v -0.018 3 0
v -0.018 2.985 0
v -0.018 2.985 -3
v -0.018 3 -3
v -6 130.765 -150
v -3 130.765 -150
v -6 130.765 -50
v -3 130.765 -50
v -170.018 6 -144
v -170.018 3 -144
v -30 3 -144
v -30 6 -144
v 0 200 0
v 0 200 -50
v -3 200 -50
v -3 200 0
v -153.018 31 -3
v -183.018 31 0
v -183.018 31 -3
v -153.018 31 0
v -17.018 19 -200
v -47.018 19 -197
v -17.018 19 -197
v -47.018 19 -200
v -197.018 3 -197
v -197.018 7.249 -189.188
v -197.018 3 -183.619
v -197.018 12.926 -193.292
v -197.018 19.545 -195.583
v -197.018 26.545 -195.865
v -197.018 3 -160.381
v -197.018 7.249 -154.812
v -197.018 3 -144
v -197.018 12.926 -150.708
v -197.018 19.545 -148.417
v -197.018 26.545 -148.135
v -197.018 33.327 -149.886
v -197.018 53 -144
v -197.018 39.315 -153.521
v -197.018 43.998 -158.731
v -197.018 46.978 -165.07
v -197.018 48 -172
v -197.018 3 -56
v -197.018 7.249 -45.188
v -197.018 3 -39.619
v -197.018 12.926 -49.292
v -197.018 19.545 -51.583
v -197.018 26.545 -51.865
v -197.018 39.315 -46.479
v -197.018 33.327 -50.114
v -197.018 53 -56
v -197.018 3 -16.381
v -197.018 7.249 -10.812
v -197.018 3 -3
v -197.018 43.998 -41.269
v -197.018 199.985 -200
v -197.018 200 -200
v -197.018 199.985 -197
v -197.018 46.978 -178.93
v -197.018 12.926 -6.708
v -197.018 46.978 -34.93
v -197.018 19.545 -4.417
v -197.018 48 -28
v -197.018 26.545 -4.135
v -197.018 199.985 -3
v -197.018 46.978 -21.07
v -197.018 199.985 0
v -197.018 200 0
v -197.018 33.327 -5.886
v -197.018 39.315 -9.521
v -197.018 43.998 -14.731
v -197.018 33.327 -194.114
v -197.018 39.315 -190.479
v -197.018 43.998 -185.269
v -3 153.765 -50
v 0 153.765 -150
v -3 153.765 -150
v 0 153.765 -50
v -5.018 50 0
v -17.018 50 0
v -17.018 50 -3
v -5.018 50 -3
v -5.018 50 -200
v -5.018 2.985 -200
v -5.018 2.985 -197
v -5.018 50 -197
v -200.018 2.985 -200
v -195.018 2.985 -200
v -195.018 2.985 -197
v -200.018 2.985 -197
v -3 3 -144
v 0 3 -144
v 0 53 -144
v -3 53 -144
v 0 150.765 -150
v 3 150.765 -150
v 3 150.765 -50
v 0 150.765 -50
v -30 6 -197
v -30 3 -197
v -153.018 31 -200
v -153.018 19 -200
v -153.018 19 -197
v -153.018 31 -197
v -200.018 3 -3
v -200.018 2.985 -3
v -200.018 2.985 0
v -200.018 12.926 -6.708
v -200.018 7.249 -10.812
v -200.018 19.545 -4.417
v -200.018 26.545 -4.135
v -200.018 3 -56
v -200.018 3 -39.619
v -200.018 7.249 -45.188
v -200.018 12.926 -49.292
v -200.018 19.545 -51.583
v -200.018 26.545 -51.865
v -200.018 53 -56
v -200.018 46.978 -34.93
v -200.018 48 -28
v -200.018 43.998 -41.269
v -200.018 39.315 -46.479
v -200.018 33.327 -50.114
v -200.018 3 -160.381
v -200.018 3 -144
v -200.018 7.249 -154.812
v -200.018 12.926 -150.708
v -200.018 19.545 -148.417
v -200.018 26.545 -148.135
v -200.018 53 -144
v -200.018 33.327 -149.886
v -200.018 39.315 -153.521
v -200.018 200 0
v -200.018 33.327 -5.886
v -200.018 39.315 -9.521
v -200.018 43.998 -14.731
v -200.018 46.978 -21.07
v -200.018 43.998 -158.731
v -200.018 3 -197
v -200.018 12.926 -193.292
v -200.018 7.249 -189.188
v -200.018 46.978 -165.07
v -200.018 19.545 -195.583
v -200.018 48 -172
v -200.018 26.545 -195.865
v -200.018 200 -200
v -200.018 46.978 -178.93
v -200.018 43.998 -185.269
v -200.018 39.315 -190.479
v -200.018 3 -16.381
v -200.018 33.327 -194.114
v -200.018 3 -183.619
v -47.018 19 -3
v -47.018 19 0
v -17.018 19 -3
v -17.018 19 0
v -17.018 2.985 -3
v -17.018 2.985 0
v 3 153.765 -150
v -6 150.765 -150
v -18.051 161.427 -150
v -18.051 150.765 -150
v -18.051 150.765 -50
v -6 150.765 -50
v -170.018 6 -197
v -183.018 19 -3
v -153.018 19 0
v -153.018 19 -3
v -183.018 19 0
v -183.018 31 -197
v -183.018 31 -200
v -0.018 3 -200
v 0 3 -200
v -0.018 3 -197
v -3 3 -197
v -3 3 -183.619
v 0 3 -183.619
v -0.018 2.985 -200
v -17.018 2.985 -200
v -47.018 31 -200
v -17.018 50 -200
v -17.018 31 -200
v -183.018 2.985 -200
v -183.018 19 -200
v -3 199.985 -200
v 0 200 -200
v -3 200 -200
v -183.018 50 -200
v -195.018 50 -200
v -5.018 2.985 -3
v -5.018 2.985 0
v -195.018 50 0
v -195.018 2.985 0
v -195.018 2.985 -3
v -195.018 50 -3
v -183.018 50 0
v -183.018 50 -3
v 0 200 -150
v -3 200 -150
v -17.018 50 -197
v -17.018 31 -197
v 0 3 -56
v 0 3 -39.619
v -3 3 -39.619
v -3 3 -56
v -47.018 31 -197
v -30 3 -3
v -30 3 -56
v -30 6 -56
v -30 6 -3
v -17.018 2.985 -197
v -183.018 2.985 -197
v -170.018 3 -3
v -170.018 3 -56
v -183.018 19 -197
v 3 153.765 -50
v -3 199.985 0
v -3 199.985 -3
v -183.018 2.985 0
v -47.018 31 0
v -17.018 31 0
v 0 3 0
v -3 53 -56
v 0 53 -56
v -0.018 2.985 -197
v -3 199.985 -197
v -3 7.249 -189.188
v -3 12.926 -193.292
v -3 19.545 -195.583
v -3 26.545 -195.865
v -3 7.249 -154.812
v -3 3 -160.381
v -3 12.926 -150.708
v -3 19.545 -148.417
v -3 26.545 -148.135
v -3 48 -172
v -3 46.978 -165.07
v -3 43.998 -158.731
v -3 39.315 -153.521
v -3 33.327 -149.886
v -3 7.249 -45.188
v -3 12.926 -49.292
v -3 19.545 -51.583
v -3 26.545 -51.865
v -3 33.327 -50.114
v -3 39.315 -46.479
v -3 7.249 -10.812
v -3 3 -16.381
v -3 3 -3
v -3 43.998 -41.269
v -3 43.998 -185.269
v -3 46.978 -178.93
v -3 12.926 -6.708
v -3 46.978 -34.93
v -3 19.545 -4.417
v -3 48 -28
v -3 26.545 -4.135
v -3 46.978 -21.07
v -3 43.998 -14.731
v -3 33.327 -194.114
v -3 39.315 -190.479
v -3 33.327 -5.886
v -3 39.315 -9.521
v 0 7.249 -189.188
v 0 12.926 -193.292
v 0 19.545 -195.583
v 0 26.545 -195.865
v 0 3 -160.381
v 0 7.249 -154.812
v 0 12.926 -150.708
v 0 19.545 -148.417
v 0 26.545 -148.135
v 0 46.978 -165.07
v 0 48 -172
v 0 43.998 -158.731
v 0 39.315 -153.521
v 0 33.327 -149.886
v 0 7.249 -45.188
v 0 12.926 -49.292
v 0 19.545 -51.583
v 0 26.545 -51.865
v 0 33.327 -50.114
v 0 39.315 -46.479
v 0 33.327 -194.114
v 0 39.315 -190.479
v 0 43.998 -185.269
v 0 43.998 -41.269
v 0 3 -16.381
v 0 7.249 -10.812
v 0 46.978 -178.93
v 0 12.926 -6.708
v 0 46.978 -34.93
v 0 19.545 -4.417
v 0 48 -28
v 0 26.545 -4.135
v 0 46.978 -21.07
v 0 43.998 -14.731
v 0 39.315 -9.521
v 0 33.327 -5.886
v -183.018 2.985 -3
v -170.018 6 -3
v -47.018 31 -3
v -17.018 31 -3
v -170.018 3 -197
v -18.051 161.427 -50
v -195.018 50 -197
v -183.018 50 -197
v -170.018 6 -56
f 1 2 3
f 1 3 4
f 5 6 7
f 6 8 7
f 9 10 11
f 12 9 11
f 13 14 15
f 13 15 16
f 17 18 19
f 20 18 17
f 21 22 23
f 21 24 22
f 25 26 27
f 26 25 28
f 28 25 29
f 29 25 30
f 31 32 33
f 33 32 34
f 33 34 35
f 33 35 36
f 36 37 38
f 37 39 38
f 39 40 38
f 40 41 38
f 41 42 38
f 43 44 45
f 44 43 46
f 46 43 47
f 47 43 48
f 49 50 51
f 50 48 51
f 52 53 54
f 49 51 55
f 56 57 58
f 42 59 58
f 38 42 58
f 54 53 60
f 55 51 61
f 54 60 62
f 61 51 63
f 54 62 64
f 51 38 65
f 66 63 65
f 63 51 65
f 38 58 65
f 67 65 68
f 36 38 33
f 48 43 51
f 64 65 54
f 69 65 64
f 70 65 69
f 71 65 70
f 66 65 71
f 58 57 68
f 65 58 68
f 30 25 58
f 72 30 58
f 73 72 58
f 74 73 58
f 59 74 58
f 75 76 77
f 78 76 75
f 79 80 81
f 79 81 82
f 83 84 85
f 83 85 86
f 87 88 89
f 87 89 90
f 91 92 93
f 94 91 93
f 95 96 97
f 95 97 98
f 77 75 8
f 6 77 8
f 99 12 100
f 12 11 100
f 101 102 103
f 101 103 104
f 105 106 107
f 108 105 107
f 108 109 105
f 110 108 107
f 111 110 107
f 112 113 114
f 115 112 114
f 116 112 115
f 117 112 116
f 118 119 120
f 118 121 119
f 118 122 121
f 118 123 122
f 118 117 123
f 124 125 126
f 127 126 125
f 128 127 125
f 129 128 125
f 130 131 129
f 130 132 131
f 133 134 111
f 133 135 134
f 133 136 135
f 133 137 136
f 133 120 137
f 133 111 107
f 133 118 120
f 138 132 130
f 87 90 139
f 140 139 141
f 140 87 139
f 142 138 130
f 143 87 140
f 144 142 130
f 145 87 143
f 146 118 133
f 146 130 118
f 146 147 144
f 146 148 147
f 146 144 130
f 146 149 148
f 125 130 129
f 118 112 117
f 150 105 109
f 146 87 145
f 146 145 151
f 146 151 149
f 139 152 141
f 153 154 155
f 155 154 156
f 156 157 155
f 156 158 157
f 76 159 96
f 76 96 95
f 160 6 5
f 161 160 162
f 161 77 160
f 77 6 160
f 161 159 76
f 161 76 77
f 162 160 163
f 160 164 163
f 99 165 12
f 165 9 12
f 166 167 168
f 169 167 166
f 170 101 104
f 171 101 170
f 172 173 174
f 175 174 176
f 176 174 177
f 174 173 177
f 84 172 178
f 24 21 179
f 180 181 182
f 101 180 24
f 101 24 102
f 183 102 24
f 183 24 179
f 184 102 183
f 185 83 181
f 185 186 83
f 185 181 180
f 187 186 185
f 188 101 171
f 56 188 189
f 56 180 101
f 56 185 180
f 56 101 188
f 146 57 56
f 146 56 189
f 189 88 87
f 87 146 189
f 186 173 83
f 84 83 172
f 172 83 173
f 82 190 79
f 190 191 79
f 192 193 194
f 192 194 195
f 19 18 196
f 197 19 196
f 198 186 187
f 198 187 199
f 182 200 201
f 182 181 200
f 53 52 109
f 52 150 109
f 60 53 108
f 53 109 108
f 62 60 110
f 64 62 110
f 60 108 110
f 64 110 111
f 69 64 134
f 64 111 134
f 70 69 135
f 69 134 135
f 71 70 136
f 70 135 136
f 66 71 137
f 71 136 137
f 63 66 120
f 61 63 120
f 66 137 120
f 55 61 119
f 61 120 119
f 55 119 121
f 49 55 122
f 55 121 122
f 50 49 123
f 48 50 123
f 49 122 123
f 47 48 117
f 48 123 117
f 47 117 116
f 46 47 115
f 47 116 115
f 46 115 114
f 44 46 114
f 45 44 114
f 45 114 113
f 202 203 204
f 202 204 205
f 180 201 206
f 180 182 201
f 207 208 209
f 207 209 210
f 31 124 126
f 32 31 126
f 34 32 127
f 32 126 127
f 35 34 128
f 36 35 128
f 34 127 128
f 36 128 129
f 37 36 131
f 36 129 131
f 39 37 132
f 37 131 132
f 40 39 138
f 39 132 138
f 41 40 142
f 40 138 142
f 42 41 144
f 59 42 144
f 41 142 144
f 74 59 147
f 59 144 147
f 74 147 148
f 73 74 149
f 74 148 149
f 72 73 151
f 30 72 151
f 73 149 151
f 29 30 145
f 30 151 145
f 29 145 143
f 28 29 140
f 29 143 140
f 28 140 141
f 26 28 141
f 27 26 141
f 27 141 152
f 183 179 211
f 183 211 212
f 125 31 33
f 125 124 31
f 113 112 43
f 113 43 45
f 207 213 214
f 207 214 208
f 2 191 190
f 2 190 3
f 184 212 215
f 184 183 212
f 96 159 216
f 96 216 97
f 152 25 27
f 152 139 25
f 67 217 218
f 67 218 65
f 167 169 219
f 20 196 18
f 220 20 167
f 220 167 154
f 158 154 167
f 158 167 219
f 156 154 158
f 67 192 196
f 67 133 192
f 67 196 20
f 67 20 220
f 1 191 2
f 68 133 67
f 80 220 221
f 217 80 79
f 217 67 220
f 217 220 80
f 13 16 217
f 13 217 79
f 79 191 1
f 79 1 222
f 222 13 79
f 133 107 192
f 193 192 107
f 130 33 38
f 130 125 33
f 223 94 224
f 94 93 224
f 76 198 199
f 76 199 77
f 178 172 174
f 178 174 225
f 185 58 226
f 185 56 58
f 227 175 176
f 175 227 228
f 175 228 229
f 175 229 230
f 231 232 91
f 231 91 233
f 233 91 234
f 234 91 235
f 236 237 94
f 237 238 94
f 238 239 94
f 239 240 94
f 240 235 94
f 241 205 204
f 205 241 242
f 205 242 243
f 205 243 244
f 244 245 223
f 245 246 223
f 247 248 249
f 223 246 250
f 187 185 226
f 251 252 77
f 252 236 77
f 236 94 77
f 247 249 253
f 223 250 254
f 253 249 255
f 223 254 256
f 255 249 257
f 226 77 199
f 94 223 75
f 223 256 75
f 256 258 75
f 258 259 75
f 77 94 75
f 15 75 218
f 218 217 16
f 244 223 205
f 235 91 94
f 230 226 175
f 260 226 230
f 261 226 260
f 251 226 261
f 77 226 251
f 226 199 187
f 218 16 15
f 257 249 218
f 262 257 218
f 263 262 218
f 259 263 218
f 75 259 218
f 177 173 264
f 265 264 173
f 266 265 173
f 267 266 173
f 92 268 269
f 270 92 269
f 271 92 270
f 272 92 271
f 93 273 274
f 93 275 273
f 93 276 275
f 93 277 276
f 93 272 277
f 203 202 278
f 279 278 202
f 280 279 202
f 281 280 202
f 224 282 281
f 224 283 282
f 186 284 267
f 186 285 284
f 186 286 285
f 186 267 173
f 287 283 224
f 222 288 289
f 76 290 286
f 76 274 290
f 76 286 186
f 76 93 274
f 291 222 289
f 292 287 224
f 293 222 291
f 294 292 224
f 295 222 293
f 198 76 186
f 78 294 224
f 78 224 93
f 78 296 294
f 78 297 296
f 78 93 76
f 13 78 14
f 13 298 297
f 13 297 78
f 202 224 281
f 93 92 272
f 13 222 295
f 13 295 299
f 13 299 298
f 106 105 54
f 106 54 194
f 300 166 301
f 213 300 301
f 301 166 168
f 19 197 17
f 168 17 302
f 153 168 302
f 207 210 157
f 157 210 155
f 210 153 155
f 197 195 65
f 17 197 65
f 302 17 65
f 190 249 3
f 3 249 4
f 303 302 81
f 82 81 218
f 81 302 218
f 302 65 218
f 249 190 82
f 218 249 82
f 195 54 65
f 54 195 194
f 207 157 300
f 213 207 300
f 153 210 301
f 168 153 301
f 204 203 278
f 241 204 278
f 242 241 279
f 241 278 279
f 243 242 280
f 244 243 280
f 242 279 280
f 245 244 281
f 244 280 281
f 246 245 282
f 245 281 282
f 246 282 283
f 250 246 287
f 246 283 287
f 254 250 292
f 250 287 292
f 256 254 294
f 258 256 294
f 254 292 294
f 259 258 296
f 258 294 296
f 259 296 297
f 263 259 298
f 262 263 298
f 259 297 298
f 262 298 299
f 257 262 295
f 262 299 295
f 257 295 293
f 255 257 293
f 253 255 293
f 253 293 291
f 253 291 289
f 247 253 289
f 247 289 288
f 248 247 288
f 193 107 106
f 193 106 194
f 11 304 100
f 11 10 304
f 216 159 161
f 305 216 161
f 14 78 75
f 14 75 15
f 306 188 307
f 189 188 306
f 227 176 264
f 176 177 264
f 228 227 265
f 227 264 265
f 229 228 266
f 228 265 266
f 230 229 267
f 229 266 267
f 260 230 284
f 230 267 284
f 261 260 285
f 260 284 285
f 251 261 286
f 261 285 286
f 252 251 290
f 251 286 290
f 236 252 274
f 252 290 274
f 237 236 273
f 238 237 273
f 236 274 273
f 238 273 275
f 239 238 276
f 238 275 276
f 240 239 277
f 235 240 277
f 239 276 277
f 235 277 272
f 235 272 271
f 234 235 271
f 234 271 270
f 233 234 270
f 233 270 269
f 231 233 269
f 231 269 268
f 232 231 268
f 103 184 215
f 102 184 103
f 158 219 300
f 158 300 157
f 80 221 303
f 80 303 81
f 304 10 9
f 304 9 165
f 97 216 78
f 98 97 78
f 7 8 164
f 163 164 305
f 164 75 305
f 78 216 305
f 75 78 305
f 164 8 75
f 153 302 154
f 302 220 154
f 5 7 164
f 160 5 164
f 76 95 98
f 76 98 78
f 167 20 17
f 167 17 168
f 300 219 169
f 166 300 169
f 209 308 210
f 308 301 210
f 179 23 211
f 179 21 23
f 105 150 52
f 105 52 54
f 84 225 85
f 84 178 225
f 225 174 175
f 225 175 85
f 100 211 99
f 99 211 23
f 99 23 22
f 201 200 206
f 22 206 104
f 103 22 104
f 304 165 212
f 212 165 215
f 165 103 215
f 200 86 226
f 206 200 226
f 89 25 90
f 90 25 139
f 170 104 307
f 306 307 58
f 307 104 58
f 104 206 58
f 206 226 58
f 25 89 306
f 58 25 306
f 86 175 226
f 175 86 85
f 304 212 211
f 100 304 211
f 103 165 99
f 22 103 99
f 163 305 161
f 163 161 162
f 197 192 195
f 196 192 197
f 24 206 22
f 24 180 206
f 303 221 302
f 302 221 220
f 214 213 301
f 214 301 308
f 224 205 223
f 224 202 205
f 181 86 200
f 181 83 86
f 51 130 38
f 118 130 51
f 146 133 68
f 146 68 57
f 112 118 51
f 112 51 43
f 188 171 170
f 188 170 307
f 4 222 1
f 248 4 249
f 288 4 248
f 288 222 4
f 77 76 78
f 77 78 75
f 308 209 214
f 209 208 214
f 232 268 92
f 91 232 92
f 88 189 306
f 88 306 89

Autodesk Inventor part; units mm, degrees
ref_plane "YZ Plane" through (0, 0, 0) normal (1, 0, 0) x (0, 1, 0)
ref_plane "XZ Plane" through (0, 0, 0) normal (0, 1, 0) x (-1, 0, 0)
ref_plane "XY Plane" through (0, 0, 0) normal (0, 0, 1) x (1, 0, 0)
sketch "Sketch1" plane through (0, 0, 0) normal (0, 0, 1) x (1, 0, 0)
  line L0 (-200.0185, 197.9846) -> (-0.0185, -2.0154) construction
  line L1 (-200.0185, -2.0154) -> (-0.0185, 197.9846) construction
  line L2 (-200.0185, 2.9846) -> (-0.0185, 2.9846)
  line L3 (-0.0185, 2.9846) -> (-5.0185, 2.9846)
  line L4 (-17.0185, -0.0154) -> (-5.0185, -0.0154)
  line L5 (-17.0185, 6.9846) -> (-17.0185, 18.9846)
  line L6 (-47.0185, 6.9846) -> (-17.0185, 18.9846) construction
  line L7 (-17.0185, 6.9846) -> (-47.0185, 18.9846) construction
  line L8 (-195.0185, 25.9846) -> (-195.0185, -0.0154)
  line L9 (-195.0185, -0.0154) -> (-183.0185, -0.0154)
  line L10 (-183.0185, -0.0154) -> (-183.0185, 25.9846)
  line L11 (-183.0185, 25.9846) -> (-195.0185, -0.0154) construction
  line L12 (-195.0185, 25.9846) -> (-183.0185, -0.0154) construction
  line L13 (-168.0185, 12.9846) -> (-183.0185, 6.9846) construction
  line L14 (-0.0185, 2.9846) -> (-0.0185, 199.9846)
  line L15 (-0.0185, 199.9846) -> (-200.0185, 199.9846)
  line L16 (-200.0185, 2.9846) -> (-200.0185, 199.9846)
  line L17 (-183.0185, 18.9846) -> (-180.1613, 17.8418) construction
  line L18 (-168.0185, 12.9846) -> (-153.0185, 6.9846) construction
  line L19 (-5.0185, 0) -> (-17.0185, 0)
  line L20 (-183.0185, 0) -> (-195.0185, 0)
  line L21 (-5.0185, 0) -> (-5.0185, 50)
  line L22 (-17.0185, 0) -> (-17.0185, 50)
  line L23 (-17.0185, 50) -> (-5.0185, 50)
  line L24 (-5.0185, 25) -> (-47.0185, 25)
  line L25 (-47.0185, 19) -> (-5.0185, 19)
  line L26 (-5.0185, 19) -> (-5.0185, 31)
  line L27 (-5.0185, 31) -> (-47.0185, 31)
  line L28 (-47.0185, 31) -> (-47.0185, 19)
  line L29 (-47.0185, 19) -> (-5.0185, 31) construction
  line L30 (-5.0185, 19) -> (-47.0185, 31) construction
  line L31 (-183.0185, 0) -> (-183.0185, 50)
  line L32 (-195.0185, 0) -> (-195.0185, 50)
  line L33 (-195.0185, 50) -> (-183.0185, 50)
  line L34 (-195.0185, 25) -> (-153.0185, 25)
  line L35 (-153.0185, 19) -> (-195.0185, 19)
  line L36 (-195.0185, 19) -> (-195.0185, 31)
  line L37 (-195.0185, 31) -> (-153.0185, 31)
  line L38 (-153.0185, 31) -> (-153.0185, 19)
  line L39 (-153.0185, 19) -> (-195.0185, 31) construction
  line L40 (-195.0185, 19) -> (-153.0185, 31) construction
  point P0 (-32.0185, 12.9846)
  point P1 (-26.0185, 25)
  point P2 (-174.0185, 25)
  point P3 (-195.0185, 2.9846)
  point P4 (-183.0185, 31)
  point P5 (-183.0185, 19)
  point P6 (-183.0185, 2.9846)
  point P7 (-17.0185, 2.9846)
  point P8 (-17.0185, 19)
  point P9 (-17.0185, 31)
  dimension "d63" = 50
  dimension "d64" = 50
  dimension "d65" = 42
  dimension "d66" = 12
  dimension "d67" = 50
  dimension "d68" = 50
  dimension "d69" = 42
  dimension "d70" = 12
sketch "Sketch3" plane through (0, 0, 0) normal (1, 0, 0) x (0, 1, 0)
  line L0 (3, -200) -> (200, -200)
  line L1 (200, -200) -> (200, 0)
  line L2 (200, 0) -> (3, 0)
  line L3 (3, -200) -> (3, -185)
  line L4 (3, 0) -> (3, -30)
  line L5 (3, 0) -> (3, -30)
  line L6 (3, -170) -> (3, -200)
  line L7 (3, -200) -> (3, -144)
  line L8 (3, 0) -> (3, -56)
  line L9 (3, -56) -> (53, -56)
  line L10 (3, -144) -> (53, -144)
  line L11 (53, -144) -> (53, -56)
  line L12 (3, 0) -> (3, -28)
  line L13 (3, -172) -> (24, -172)
  circle A0 centre (24, -172) radius 24
  line L14 (3, -28) -> (24, -28)
  circle A1 centre (24, -28) radius 24
  point P0 (3, -16.381)
  point P1 (3, -39.619)
  point P2 (3, -160.381)
  point P3 (3, -183.619)
  dimension "d71" = 56
  dimension "d72" = 56
  dimension "d73" = 50
  dimension "d74" = 50
  dimension "d108" = 21
  dimension "d109" = 48
  dimension "d110" = 21
  dimension "d111" = 48
extrude "Extrusion1" add sketch "Sketch1" against normal blind 3 contours L21 L23 L22 L27 L28 L25 L5 L2 L10 L35 L38 L37 L31 L33 L32 L8 L16 L15 L14
extrude "Extrusion2" add sketch "Sketch3" against normal blind 3 contours L3 L6 A0 L7 L10 L11 L9 L8 A1 L4 L2 L1 L0
sketch "Sketch4" plane through (-200.0185, 2.9846, 0) normal (-1, 0, 0) x (0, 0, 1)
  line L0 (-3, 197) -> (-3, 0.0154) projected
  line L1 (0, 197) -> (-3, 197) projected
  line L2 (0, 197) -> (0, 197.0154) projected
  line L3 (0, 197.0154) -> (-200, 197.0154) projected
  line L4 (-200, 197.0154) -> (-200, 0.0154) projected
  line L5 (-144, 0.0154) -> (-144, 50.0154) projected
  line L6 (-144, 50.0154) -> (-56, 50.0154) projected
  line L7 (-56, 50.0154) -> (-56, 0.0154) projected
  line L8 (-3, 0) -> (-3, 197) projected
  line L9 (-56, 0.0154) -> (-3, 0.0154) projected
  arc A0 (-16.1257, 0.0154) -> (-3, 22.0154) centre (-28, 22.0154) ccw projected
  line L10 (-144, 0.0154) -> (-56, 0.0154)
  line L11 (-200, 197.0154) -> (-200, 147.0154)
  line L12 (-200, 147.0154) -> (-3, 147.0154)
  line L13 (-144, 0.0154) -> (-144, 197.0154)
  line L14 (-56, 0.0154) -> (-56, 197.0154)
  line L15 (-16.381, 0.0154) -> (-3, 0.0154) projected
  line L16 (-200, 0.0154) -> (-183.619, 0.0154) projected
  arc A1 (-160.381, 0.0154) -> (-183.619, 0.0154) centre (-172, 21.0154) ccw projected
  line L17 (-160.381, 0.0154) -> (-144, 0.0154) projected
  line L18 (-56, 0.0154) -> (-39.619, 0.0154) projected
  arc A2 (-16.381, 0.0154) -> (-39.619, 0.0154) centre (-28, 21.0154) ccw projected
  point P0 (-3, 147.0154)
  point P1 (-56, 147.0154)
  point P2 (-144, 147.0154)
  point P3 (-56, 50.0154)
  dimension "d87" = 50
extrude "Extrusion3" add sketch "Sketch4" against normal blind 3 contours L0 L12 L14 L3 L2 L1 | L0 A0 L9 A2 L7 L14 L12 | L0 L9 A0 | L14 L6 L13 L12 | L12 L13 L3 L14 | L13 L5 L17 A1 L16 L4 L12 | L12 L4 L3 L13
sketch "Sketch5" plane through (-200.0185, 3, -200) normal (0, 0, -1) x (-1, 0, 0)
  line L0 (-3, 0) -> (-3, 196.9846) projected
  line L1 (-3, 196.9846) -> (-197.0185, 196.9846) projected
  line L2 (-197.0185, 196.9846) -> (-197.0185, 0) projected
  line L3 (-197.0185, 0) -> (-200, 0) projected
  line L4 (-200, 0) -> (-200, -0.0154) projected
  line L5 (-200, -0.0154) -> (-195, -0.0154) projected
  line L6 (-195, -0.0154) -> (-195, 47) projected
  line L7 (-195, 47) -> (-183, 47) projected
  line L8 (-183, 47) -> (-183, 28) projected
  line L9 (-183, 28) -> (-153, 28) projected
  line L10 (-153, 28) -> (-153, 16) projected
  line L11 (-153, 16) -> (-183, 16) projected
  line L12 (-183, 16) -> (-183, -0.0154) projected
  line L13 (-183, -0.0154) -> (-17, -0.0154) projected
  line L14 (-17, -0.0154) -> (-17, 16) projected
  line L15 (-17, 16) -> (-47, 16) projected
  line L16 (-47, 16) -> (-47, 28) projected
  line L17 (-47, 28) -> (-17, 28) projected
  line L18 (-17, 28) -> (-17, 47) projected
  line L19 (-17, 47) -> (-5, 47) projected
  line L20 (-5, 47) -> (-5, -0.0154) projected
  line L21 (-5, -0.0154) -> (0, -0.0154) projected
  line L22 (0, -0.0154) -> (0, 0) projected
  line L23 (0, 0) -> (-3, 0) projected
extrude "Extrusion4" add sketch "Sketch5" against normal blind 3
sketch "Sketch6" plane through (0, 3, -56) normal (0, -1, 0) x (1, 0, 0)
  line L0 (-3, 53) -> (-0.0185, 53) projected
  line L1 (-3, 39.619) -> (-3, 53) projected
  line L2 (0, 56) -> (0, 39.619) projected
  line L3 (0, 56) -> (-0.0185, 56) projected
  line L4 (-0.0185, 53) -> (-0.0185, 56) projected
  line L5 (-5.0185, 56) -> (-0.0185, 56) projected
  line L6 (-5.0185, 56) -> (-5.0185, 53) projected
  line L7 (-0.0185, 53) -> (-5.0185, 53) projected
  line L8 (-0.0185, 56) -> (-0.0185, 53) projected
  line L9 (0, 16.381) -> (0, 0) projected
  line L10 (-3, 0) -> (-3, 16.381) projected
  line L11 (0, 0) -> (-3, 0) projected
  line L12 (0, -88) -> (0, -104.381) projected
  line L13 (0, -88) -> (-3, -88) projected
  line L14 (-3, -104.381) -> (-3, -88) projected
  line L15 (-0.0185, -141) -> (-0.0185, -144) projected
  line L16 (0, -144) -> (-0.0185, -144) projected
  line L17 (0, -127.619) -> (0, -144) projected
  line L18 (-3, -141) -> (-3, -127.619) projected
  line L19 (-3, -141) -> (-0.0185, -141) projected
  line L20 (-0.0185, -144) -> (-5.0185, -144) projected
  line L21 (-0.0185, -144) -> (-0.0185, -141) projected
  line L22 (-5.0185, -141) -> (-0.0185, -141) projected
  line L23 (-5.0185, -144) -> (-5.0185, -141) projected
  line L24 (-17.0185, -144) -> (-183.0185, -144) projected
  line L25 (-17.0185, -144) -> (-17.0185, -141) projected
  line L26 (-183.0185, -141) -> (-17.0185, -141) projected
  line L27 (-183.0185, -144) -> (-183.0185, -141) projected
  line L28 (-195.0185, -144) -> (-200.0185, -144) projected
  line L29 (-195.0185, -144) -> (-195.0185, -141) projected
  line L30 (-200.0185, -141) -> (-195.0185, -141) projected
  line L31 (-200.0185, -144) -> (-200.0185, -141) projected
  line L32 (-200.0185, -141) -> (-197.0185, -141) projected
  line L33 (-197.0185, -127.8743) -> (-197.0185, -141) projected
  line L34 (-200.0185, -127.8743) -> (-197.0185, -127.8743) projected
  line L35 (-200.0185, -141) -> (-200.0185, -127.8743) projected
  line L36 (-200.0185, -104.1257) -> (-200.0185, 16.1257) projected
  line L37 (-200.0185, -104.1257) -> (-197.0185, -104.1257) projected
  line L38 (-197.0185, 16.1257) -> (-197.0185, -104.1257) projected
  line L39 (-183.0185, 56) -> (-17.0185, 56) projected
  line L40 (-183.0185, 56) -> (-183.0185, 53) projected
  line L41 (-17.0185, 53) -> (-183.0185, 53) projected
  line L42 (-17.0185, 56) -> (-17.0185, 53) projected
  line L43 (-200.0185, 56) -> (-195.0185, 56) projected
  line L44 (-200.0185, 56) -> (-200.0185, 53) projected
  line L45 (-195.0185, 53) -> (-200.0185, 53) projected
  line L46 (-195.0185, 56) -> (-195.0185, 53) projected
  line L47 (-200.0185, 39.8743) -> (-200.0185, 53) projected
  line L48 (-200.0185, 39.8743) -> (-197.0185, 39.8743) projected
  line L49 (-197.0185, 53) -> (-197.0185, 39.8743) projected
  line L50 (-200.0185, 53) -> (-197.0185, 53) projected
  line L51 (-200.0185, 0) -> (-200.0185, 16.1257) projected
  line L52 (-200.0185, 0) -> (-197.0185, 0) projected
  line L53 (-197.0185, 16.1257) -> (-197.0185, 0) projected
  line L54 (-200.0185, 16.1257) -> (-197.0185, 16.1257) projected
  line L55 (-3, 0) -> (-197.0185, 0)
  line L56 (-197.0185, -88) -> (-3, -88)
  line L57 (-200.0185, 16.1257) -> (-197.0185, 16.1257) projected
  line L58 (-197.0185, -88) -> (-157.0185, -88)
  line L59 (-157.0185, -88) -> (-157.0185, 0)
  line L60 (-3, -88) -> (-30, -88)
  line L61 (-30, -88) -> (-30, -141)
  line L62 (-30, -141) -> (-30, 53)
  line L63 (-197.0185, 53) -> (-170.0185, 53)
  line L64 (-170.0185, 53) -> (-170.0185, -141)
  line L65 (0, -104.381) -> (-3, -104.381) projected
  line L66 (0, 16.381) -> (-3, 16.381) projected
  line L67 (0, 39.619) -> (-3, 39.619) projected
  line L68 (0, -127.619) -> (-3, -127.619) projected
  point P0 (-170.0185, 0)
  point P1 (-30, 0)
  point P2 (-170.0185, -88)
  dimension "d88" = 40
extrude "Extrusion5" add sketch "Sketch6" against normal blind 3 contours L55 L64 L41 L62 | L61 L26 L64 L56
sketch "Sketch7" plane through (0, 0, 0) normal (1, 0, 0) x (0, 0, -1)
  line L0 (200, 200) -> (0, 200) projected
  line L1 (50, 200) -> (150, 200)
  line L2 (150, 200) -> (150, 153.765)
  line L3 (150, 153.765) -> (50, 153.765)
  line L4 (50, 153.765) -> (50, 200)
  line L5 (200, 3) -> (200, 200) projected
  point P0 (0, 0)
  dimension "d91" = 100
  dimension "d92" = 46.235
  dimension "d93" = 50
extrude "Extrusion6" cut sketch "Sketch7" against normal blind 3
sketch "Sketch9" plane through (0, 153.765, -50) normal (0, 0, -1) x (-1, 0, 0)
  line L0 (0, 0) -> (3, 0)
  line L1 (3, 75.6757) -> (3, -99.3089)
  line L2 (-3, 0) -> (18.0513, 7.662)
  line L3 (18.0513, 7.662) -> (18.0513, -3)
  line L4 (0, 0) -> (-3, 0)
  line L5 (-3, 0) -> (-3, -3)
  line L6 (-3, -3) -> (0, -3)
  line L7 (0, -3) -> (0, 0)
  line L8 (3, -23) -> (6, -23)
  line L9 (6, -23) -> (6, -3)
  line L10 (6, -3) -> (3, -3)
  line L11 (3, -3) -> (3, -23)
  line L12 (6, -3) -> (18.0513, -3)
  line L13 (0, -3) -> (0, 0)
  line L14 (0, 72.6911) -> (0, -124.5109)
  line L15 (3, 0) -> (3, -3)
  line L16 (0, 0) -> (0, 1.0919)
  line L17 (0, 0) -> (0, 72.6911)
  line L18 (0, 0) -> (3, 0)
  line L19 (3, 0) -> (3, 2.1838)
  line L20 (0, 46.235) -> (0, -150.765) projected
  line L21 (3, 46.2196) -> (3, -150.765) projected
  line L22 (0, 0) -> (3, 0) projected
  line L23 (3, 46.235) -> (3, 0) projected
  point P0 (0, -153.765)
  point P1 (-77.5449, -124.3089)
  point P2 (-74.5449, 26.4561)
  point P3 (3, -128.765)
  dimension "d96" = 3
  dimension "d97" = 3
  dimension "d98" = 20
  dimension "d99" = 3
  dimension "d100" = 10.6621
  dimension "d101" = 3
  dimension "d102" = 15.0513
  dimension "d103" = 20
extrude "Extrusion7" add sketch "Sketch9" along normal up to surface (100 mm away) separate body
properties part number "Chassis Conceptual Geo"
